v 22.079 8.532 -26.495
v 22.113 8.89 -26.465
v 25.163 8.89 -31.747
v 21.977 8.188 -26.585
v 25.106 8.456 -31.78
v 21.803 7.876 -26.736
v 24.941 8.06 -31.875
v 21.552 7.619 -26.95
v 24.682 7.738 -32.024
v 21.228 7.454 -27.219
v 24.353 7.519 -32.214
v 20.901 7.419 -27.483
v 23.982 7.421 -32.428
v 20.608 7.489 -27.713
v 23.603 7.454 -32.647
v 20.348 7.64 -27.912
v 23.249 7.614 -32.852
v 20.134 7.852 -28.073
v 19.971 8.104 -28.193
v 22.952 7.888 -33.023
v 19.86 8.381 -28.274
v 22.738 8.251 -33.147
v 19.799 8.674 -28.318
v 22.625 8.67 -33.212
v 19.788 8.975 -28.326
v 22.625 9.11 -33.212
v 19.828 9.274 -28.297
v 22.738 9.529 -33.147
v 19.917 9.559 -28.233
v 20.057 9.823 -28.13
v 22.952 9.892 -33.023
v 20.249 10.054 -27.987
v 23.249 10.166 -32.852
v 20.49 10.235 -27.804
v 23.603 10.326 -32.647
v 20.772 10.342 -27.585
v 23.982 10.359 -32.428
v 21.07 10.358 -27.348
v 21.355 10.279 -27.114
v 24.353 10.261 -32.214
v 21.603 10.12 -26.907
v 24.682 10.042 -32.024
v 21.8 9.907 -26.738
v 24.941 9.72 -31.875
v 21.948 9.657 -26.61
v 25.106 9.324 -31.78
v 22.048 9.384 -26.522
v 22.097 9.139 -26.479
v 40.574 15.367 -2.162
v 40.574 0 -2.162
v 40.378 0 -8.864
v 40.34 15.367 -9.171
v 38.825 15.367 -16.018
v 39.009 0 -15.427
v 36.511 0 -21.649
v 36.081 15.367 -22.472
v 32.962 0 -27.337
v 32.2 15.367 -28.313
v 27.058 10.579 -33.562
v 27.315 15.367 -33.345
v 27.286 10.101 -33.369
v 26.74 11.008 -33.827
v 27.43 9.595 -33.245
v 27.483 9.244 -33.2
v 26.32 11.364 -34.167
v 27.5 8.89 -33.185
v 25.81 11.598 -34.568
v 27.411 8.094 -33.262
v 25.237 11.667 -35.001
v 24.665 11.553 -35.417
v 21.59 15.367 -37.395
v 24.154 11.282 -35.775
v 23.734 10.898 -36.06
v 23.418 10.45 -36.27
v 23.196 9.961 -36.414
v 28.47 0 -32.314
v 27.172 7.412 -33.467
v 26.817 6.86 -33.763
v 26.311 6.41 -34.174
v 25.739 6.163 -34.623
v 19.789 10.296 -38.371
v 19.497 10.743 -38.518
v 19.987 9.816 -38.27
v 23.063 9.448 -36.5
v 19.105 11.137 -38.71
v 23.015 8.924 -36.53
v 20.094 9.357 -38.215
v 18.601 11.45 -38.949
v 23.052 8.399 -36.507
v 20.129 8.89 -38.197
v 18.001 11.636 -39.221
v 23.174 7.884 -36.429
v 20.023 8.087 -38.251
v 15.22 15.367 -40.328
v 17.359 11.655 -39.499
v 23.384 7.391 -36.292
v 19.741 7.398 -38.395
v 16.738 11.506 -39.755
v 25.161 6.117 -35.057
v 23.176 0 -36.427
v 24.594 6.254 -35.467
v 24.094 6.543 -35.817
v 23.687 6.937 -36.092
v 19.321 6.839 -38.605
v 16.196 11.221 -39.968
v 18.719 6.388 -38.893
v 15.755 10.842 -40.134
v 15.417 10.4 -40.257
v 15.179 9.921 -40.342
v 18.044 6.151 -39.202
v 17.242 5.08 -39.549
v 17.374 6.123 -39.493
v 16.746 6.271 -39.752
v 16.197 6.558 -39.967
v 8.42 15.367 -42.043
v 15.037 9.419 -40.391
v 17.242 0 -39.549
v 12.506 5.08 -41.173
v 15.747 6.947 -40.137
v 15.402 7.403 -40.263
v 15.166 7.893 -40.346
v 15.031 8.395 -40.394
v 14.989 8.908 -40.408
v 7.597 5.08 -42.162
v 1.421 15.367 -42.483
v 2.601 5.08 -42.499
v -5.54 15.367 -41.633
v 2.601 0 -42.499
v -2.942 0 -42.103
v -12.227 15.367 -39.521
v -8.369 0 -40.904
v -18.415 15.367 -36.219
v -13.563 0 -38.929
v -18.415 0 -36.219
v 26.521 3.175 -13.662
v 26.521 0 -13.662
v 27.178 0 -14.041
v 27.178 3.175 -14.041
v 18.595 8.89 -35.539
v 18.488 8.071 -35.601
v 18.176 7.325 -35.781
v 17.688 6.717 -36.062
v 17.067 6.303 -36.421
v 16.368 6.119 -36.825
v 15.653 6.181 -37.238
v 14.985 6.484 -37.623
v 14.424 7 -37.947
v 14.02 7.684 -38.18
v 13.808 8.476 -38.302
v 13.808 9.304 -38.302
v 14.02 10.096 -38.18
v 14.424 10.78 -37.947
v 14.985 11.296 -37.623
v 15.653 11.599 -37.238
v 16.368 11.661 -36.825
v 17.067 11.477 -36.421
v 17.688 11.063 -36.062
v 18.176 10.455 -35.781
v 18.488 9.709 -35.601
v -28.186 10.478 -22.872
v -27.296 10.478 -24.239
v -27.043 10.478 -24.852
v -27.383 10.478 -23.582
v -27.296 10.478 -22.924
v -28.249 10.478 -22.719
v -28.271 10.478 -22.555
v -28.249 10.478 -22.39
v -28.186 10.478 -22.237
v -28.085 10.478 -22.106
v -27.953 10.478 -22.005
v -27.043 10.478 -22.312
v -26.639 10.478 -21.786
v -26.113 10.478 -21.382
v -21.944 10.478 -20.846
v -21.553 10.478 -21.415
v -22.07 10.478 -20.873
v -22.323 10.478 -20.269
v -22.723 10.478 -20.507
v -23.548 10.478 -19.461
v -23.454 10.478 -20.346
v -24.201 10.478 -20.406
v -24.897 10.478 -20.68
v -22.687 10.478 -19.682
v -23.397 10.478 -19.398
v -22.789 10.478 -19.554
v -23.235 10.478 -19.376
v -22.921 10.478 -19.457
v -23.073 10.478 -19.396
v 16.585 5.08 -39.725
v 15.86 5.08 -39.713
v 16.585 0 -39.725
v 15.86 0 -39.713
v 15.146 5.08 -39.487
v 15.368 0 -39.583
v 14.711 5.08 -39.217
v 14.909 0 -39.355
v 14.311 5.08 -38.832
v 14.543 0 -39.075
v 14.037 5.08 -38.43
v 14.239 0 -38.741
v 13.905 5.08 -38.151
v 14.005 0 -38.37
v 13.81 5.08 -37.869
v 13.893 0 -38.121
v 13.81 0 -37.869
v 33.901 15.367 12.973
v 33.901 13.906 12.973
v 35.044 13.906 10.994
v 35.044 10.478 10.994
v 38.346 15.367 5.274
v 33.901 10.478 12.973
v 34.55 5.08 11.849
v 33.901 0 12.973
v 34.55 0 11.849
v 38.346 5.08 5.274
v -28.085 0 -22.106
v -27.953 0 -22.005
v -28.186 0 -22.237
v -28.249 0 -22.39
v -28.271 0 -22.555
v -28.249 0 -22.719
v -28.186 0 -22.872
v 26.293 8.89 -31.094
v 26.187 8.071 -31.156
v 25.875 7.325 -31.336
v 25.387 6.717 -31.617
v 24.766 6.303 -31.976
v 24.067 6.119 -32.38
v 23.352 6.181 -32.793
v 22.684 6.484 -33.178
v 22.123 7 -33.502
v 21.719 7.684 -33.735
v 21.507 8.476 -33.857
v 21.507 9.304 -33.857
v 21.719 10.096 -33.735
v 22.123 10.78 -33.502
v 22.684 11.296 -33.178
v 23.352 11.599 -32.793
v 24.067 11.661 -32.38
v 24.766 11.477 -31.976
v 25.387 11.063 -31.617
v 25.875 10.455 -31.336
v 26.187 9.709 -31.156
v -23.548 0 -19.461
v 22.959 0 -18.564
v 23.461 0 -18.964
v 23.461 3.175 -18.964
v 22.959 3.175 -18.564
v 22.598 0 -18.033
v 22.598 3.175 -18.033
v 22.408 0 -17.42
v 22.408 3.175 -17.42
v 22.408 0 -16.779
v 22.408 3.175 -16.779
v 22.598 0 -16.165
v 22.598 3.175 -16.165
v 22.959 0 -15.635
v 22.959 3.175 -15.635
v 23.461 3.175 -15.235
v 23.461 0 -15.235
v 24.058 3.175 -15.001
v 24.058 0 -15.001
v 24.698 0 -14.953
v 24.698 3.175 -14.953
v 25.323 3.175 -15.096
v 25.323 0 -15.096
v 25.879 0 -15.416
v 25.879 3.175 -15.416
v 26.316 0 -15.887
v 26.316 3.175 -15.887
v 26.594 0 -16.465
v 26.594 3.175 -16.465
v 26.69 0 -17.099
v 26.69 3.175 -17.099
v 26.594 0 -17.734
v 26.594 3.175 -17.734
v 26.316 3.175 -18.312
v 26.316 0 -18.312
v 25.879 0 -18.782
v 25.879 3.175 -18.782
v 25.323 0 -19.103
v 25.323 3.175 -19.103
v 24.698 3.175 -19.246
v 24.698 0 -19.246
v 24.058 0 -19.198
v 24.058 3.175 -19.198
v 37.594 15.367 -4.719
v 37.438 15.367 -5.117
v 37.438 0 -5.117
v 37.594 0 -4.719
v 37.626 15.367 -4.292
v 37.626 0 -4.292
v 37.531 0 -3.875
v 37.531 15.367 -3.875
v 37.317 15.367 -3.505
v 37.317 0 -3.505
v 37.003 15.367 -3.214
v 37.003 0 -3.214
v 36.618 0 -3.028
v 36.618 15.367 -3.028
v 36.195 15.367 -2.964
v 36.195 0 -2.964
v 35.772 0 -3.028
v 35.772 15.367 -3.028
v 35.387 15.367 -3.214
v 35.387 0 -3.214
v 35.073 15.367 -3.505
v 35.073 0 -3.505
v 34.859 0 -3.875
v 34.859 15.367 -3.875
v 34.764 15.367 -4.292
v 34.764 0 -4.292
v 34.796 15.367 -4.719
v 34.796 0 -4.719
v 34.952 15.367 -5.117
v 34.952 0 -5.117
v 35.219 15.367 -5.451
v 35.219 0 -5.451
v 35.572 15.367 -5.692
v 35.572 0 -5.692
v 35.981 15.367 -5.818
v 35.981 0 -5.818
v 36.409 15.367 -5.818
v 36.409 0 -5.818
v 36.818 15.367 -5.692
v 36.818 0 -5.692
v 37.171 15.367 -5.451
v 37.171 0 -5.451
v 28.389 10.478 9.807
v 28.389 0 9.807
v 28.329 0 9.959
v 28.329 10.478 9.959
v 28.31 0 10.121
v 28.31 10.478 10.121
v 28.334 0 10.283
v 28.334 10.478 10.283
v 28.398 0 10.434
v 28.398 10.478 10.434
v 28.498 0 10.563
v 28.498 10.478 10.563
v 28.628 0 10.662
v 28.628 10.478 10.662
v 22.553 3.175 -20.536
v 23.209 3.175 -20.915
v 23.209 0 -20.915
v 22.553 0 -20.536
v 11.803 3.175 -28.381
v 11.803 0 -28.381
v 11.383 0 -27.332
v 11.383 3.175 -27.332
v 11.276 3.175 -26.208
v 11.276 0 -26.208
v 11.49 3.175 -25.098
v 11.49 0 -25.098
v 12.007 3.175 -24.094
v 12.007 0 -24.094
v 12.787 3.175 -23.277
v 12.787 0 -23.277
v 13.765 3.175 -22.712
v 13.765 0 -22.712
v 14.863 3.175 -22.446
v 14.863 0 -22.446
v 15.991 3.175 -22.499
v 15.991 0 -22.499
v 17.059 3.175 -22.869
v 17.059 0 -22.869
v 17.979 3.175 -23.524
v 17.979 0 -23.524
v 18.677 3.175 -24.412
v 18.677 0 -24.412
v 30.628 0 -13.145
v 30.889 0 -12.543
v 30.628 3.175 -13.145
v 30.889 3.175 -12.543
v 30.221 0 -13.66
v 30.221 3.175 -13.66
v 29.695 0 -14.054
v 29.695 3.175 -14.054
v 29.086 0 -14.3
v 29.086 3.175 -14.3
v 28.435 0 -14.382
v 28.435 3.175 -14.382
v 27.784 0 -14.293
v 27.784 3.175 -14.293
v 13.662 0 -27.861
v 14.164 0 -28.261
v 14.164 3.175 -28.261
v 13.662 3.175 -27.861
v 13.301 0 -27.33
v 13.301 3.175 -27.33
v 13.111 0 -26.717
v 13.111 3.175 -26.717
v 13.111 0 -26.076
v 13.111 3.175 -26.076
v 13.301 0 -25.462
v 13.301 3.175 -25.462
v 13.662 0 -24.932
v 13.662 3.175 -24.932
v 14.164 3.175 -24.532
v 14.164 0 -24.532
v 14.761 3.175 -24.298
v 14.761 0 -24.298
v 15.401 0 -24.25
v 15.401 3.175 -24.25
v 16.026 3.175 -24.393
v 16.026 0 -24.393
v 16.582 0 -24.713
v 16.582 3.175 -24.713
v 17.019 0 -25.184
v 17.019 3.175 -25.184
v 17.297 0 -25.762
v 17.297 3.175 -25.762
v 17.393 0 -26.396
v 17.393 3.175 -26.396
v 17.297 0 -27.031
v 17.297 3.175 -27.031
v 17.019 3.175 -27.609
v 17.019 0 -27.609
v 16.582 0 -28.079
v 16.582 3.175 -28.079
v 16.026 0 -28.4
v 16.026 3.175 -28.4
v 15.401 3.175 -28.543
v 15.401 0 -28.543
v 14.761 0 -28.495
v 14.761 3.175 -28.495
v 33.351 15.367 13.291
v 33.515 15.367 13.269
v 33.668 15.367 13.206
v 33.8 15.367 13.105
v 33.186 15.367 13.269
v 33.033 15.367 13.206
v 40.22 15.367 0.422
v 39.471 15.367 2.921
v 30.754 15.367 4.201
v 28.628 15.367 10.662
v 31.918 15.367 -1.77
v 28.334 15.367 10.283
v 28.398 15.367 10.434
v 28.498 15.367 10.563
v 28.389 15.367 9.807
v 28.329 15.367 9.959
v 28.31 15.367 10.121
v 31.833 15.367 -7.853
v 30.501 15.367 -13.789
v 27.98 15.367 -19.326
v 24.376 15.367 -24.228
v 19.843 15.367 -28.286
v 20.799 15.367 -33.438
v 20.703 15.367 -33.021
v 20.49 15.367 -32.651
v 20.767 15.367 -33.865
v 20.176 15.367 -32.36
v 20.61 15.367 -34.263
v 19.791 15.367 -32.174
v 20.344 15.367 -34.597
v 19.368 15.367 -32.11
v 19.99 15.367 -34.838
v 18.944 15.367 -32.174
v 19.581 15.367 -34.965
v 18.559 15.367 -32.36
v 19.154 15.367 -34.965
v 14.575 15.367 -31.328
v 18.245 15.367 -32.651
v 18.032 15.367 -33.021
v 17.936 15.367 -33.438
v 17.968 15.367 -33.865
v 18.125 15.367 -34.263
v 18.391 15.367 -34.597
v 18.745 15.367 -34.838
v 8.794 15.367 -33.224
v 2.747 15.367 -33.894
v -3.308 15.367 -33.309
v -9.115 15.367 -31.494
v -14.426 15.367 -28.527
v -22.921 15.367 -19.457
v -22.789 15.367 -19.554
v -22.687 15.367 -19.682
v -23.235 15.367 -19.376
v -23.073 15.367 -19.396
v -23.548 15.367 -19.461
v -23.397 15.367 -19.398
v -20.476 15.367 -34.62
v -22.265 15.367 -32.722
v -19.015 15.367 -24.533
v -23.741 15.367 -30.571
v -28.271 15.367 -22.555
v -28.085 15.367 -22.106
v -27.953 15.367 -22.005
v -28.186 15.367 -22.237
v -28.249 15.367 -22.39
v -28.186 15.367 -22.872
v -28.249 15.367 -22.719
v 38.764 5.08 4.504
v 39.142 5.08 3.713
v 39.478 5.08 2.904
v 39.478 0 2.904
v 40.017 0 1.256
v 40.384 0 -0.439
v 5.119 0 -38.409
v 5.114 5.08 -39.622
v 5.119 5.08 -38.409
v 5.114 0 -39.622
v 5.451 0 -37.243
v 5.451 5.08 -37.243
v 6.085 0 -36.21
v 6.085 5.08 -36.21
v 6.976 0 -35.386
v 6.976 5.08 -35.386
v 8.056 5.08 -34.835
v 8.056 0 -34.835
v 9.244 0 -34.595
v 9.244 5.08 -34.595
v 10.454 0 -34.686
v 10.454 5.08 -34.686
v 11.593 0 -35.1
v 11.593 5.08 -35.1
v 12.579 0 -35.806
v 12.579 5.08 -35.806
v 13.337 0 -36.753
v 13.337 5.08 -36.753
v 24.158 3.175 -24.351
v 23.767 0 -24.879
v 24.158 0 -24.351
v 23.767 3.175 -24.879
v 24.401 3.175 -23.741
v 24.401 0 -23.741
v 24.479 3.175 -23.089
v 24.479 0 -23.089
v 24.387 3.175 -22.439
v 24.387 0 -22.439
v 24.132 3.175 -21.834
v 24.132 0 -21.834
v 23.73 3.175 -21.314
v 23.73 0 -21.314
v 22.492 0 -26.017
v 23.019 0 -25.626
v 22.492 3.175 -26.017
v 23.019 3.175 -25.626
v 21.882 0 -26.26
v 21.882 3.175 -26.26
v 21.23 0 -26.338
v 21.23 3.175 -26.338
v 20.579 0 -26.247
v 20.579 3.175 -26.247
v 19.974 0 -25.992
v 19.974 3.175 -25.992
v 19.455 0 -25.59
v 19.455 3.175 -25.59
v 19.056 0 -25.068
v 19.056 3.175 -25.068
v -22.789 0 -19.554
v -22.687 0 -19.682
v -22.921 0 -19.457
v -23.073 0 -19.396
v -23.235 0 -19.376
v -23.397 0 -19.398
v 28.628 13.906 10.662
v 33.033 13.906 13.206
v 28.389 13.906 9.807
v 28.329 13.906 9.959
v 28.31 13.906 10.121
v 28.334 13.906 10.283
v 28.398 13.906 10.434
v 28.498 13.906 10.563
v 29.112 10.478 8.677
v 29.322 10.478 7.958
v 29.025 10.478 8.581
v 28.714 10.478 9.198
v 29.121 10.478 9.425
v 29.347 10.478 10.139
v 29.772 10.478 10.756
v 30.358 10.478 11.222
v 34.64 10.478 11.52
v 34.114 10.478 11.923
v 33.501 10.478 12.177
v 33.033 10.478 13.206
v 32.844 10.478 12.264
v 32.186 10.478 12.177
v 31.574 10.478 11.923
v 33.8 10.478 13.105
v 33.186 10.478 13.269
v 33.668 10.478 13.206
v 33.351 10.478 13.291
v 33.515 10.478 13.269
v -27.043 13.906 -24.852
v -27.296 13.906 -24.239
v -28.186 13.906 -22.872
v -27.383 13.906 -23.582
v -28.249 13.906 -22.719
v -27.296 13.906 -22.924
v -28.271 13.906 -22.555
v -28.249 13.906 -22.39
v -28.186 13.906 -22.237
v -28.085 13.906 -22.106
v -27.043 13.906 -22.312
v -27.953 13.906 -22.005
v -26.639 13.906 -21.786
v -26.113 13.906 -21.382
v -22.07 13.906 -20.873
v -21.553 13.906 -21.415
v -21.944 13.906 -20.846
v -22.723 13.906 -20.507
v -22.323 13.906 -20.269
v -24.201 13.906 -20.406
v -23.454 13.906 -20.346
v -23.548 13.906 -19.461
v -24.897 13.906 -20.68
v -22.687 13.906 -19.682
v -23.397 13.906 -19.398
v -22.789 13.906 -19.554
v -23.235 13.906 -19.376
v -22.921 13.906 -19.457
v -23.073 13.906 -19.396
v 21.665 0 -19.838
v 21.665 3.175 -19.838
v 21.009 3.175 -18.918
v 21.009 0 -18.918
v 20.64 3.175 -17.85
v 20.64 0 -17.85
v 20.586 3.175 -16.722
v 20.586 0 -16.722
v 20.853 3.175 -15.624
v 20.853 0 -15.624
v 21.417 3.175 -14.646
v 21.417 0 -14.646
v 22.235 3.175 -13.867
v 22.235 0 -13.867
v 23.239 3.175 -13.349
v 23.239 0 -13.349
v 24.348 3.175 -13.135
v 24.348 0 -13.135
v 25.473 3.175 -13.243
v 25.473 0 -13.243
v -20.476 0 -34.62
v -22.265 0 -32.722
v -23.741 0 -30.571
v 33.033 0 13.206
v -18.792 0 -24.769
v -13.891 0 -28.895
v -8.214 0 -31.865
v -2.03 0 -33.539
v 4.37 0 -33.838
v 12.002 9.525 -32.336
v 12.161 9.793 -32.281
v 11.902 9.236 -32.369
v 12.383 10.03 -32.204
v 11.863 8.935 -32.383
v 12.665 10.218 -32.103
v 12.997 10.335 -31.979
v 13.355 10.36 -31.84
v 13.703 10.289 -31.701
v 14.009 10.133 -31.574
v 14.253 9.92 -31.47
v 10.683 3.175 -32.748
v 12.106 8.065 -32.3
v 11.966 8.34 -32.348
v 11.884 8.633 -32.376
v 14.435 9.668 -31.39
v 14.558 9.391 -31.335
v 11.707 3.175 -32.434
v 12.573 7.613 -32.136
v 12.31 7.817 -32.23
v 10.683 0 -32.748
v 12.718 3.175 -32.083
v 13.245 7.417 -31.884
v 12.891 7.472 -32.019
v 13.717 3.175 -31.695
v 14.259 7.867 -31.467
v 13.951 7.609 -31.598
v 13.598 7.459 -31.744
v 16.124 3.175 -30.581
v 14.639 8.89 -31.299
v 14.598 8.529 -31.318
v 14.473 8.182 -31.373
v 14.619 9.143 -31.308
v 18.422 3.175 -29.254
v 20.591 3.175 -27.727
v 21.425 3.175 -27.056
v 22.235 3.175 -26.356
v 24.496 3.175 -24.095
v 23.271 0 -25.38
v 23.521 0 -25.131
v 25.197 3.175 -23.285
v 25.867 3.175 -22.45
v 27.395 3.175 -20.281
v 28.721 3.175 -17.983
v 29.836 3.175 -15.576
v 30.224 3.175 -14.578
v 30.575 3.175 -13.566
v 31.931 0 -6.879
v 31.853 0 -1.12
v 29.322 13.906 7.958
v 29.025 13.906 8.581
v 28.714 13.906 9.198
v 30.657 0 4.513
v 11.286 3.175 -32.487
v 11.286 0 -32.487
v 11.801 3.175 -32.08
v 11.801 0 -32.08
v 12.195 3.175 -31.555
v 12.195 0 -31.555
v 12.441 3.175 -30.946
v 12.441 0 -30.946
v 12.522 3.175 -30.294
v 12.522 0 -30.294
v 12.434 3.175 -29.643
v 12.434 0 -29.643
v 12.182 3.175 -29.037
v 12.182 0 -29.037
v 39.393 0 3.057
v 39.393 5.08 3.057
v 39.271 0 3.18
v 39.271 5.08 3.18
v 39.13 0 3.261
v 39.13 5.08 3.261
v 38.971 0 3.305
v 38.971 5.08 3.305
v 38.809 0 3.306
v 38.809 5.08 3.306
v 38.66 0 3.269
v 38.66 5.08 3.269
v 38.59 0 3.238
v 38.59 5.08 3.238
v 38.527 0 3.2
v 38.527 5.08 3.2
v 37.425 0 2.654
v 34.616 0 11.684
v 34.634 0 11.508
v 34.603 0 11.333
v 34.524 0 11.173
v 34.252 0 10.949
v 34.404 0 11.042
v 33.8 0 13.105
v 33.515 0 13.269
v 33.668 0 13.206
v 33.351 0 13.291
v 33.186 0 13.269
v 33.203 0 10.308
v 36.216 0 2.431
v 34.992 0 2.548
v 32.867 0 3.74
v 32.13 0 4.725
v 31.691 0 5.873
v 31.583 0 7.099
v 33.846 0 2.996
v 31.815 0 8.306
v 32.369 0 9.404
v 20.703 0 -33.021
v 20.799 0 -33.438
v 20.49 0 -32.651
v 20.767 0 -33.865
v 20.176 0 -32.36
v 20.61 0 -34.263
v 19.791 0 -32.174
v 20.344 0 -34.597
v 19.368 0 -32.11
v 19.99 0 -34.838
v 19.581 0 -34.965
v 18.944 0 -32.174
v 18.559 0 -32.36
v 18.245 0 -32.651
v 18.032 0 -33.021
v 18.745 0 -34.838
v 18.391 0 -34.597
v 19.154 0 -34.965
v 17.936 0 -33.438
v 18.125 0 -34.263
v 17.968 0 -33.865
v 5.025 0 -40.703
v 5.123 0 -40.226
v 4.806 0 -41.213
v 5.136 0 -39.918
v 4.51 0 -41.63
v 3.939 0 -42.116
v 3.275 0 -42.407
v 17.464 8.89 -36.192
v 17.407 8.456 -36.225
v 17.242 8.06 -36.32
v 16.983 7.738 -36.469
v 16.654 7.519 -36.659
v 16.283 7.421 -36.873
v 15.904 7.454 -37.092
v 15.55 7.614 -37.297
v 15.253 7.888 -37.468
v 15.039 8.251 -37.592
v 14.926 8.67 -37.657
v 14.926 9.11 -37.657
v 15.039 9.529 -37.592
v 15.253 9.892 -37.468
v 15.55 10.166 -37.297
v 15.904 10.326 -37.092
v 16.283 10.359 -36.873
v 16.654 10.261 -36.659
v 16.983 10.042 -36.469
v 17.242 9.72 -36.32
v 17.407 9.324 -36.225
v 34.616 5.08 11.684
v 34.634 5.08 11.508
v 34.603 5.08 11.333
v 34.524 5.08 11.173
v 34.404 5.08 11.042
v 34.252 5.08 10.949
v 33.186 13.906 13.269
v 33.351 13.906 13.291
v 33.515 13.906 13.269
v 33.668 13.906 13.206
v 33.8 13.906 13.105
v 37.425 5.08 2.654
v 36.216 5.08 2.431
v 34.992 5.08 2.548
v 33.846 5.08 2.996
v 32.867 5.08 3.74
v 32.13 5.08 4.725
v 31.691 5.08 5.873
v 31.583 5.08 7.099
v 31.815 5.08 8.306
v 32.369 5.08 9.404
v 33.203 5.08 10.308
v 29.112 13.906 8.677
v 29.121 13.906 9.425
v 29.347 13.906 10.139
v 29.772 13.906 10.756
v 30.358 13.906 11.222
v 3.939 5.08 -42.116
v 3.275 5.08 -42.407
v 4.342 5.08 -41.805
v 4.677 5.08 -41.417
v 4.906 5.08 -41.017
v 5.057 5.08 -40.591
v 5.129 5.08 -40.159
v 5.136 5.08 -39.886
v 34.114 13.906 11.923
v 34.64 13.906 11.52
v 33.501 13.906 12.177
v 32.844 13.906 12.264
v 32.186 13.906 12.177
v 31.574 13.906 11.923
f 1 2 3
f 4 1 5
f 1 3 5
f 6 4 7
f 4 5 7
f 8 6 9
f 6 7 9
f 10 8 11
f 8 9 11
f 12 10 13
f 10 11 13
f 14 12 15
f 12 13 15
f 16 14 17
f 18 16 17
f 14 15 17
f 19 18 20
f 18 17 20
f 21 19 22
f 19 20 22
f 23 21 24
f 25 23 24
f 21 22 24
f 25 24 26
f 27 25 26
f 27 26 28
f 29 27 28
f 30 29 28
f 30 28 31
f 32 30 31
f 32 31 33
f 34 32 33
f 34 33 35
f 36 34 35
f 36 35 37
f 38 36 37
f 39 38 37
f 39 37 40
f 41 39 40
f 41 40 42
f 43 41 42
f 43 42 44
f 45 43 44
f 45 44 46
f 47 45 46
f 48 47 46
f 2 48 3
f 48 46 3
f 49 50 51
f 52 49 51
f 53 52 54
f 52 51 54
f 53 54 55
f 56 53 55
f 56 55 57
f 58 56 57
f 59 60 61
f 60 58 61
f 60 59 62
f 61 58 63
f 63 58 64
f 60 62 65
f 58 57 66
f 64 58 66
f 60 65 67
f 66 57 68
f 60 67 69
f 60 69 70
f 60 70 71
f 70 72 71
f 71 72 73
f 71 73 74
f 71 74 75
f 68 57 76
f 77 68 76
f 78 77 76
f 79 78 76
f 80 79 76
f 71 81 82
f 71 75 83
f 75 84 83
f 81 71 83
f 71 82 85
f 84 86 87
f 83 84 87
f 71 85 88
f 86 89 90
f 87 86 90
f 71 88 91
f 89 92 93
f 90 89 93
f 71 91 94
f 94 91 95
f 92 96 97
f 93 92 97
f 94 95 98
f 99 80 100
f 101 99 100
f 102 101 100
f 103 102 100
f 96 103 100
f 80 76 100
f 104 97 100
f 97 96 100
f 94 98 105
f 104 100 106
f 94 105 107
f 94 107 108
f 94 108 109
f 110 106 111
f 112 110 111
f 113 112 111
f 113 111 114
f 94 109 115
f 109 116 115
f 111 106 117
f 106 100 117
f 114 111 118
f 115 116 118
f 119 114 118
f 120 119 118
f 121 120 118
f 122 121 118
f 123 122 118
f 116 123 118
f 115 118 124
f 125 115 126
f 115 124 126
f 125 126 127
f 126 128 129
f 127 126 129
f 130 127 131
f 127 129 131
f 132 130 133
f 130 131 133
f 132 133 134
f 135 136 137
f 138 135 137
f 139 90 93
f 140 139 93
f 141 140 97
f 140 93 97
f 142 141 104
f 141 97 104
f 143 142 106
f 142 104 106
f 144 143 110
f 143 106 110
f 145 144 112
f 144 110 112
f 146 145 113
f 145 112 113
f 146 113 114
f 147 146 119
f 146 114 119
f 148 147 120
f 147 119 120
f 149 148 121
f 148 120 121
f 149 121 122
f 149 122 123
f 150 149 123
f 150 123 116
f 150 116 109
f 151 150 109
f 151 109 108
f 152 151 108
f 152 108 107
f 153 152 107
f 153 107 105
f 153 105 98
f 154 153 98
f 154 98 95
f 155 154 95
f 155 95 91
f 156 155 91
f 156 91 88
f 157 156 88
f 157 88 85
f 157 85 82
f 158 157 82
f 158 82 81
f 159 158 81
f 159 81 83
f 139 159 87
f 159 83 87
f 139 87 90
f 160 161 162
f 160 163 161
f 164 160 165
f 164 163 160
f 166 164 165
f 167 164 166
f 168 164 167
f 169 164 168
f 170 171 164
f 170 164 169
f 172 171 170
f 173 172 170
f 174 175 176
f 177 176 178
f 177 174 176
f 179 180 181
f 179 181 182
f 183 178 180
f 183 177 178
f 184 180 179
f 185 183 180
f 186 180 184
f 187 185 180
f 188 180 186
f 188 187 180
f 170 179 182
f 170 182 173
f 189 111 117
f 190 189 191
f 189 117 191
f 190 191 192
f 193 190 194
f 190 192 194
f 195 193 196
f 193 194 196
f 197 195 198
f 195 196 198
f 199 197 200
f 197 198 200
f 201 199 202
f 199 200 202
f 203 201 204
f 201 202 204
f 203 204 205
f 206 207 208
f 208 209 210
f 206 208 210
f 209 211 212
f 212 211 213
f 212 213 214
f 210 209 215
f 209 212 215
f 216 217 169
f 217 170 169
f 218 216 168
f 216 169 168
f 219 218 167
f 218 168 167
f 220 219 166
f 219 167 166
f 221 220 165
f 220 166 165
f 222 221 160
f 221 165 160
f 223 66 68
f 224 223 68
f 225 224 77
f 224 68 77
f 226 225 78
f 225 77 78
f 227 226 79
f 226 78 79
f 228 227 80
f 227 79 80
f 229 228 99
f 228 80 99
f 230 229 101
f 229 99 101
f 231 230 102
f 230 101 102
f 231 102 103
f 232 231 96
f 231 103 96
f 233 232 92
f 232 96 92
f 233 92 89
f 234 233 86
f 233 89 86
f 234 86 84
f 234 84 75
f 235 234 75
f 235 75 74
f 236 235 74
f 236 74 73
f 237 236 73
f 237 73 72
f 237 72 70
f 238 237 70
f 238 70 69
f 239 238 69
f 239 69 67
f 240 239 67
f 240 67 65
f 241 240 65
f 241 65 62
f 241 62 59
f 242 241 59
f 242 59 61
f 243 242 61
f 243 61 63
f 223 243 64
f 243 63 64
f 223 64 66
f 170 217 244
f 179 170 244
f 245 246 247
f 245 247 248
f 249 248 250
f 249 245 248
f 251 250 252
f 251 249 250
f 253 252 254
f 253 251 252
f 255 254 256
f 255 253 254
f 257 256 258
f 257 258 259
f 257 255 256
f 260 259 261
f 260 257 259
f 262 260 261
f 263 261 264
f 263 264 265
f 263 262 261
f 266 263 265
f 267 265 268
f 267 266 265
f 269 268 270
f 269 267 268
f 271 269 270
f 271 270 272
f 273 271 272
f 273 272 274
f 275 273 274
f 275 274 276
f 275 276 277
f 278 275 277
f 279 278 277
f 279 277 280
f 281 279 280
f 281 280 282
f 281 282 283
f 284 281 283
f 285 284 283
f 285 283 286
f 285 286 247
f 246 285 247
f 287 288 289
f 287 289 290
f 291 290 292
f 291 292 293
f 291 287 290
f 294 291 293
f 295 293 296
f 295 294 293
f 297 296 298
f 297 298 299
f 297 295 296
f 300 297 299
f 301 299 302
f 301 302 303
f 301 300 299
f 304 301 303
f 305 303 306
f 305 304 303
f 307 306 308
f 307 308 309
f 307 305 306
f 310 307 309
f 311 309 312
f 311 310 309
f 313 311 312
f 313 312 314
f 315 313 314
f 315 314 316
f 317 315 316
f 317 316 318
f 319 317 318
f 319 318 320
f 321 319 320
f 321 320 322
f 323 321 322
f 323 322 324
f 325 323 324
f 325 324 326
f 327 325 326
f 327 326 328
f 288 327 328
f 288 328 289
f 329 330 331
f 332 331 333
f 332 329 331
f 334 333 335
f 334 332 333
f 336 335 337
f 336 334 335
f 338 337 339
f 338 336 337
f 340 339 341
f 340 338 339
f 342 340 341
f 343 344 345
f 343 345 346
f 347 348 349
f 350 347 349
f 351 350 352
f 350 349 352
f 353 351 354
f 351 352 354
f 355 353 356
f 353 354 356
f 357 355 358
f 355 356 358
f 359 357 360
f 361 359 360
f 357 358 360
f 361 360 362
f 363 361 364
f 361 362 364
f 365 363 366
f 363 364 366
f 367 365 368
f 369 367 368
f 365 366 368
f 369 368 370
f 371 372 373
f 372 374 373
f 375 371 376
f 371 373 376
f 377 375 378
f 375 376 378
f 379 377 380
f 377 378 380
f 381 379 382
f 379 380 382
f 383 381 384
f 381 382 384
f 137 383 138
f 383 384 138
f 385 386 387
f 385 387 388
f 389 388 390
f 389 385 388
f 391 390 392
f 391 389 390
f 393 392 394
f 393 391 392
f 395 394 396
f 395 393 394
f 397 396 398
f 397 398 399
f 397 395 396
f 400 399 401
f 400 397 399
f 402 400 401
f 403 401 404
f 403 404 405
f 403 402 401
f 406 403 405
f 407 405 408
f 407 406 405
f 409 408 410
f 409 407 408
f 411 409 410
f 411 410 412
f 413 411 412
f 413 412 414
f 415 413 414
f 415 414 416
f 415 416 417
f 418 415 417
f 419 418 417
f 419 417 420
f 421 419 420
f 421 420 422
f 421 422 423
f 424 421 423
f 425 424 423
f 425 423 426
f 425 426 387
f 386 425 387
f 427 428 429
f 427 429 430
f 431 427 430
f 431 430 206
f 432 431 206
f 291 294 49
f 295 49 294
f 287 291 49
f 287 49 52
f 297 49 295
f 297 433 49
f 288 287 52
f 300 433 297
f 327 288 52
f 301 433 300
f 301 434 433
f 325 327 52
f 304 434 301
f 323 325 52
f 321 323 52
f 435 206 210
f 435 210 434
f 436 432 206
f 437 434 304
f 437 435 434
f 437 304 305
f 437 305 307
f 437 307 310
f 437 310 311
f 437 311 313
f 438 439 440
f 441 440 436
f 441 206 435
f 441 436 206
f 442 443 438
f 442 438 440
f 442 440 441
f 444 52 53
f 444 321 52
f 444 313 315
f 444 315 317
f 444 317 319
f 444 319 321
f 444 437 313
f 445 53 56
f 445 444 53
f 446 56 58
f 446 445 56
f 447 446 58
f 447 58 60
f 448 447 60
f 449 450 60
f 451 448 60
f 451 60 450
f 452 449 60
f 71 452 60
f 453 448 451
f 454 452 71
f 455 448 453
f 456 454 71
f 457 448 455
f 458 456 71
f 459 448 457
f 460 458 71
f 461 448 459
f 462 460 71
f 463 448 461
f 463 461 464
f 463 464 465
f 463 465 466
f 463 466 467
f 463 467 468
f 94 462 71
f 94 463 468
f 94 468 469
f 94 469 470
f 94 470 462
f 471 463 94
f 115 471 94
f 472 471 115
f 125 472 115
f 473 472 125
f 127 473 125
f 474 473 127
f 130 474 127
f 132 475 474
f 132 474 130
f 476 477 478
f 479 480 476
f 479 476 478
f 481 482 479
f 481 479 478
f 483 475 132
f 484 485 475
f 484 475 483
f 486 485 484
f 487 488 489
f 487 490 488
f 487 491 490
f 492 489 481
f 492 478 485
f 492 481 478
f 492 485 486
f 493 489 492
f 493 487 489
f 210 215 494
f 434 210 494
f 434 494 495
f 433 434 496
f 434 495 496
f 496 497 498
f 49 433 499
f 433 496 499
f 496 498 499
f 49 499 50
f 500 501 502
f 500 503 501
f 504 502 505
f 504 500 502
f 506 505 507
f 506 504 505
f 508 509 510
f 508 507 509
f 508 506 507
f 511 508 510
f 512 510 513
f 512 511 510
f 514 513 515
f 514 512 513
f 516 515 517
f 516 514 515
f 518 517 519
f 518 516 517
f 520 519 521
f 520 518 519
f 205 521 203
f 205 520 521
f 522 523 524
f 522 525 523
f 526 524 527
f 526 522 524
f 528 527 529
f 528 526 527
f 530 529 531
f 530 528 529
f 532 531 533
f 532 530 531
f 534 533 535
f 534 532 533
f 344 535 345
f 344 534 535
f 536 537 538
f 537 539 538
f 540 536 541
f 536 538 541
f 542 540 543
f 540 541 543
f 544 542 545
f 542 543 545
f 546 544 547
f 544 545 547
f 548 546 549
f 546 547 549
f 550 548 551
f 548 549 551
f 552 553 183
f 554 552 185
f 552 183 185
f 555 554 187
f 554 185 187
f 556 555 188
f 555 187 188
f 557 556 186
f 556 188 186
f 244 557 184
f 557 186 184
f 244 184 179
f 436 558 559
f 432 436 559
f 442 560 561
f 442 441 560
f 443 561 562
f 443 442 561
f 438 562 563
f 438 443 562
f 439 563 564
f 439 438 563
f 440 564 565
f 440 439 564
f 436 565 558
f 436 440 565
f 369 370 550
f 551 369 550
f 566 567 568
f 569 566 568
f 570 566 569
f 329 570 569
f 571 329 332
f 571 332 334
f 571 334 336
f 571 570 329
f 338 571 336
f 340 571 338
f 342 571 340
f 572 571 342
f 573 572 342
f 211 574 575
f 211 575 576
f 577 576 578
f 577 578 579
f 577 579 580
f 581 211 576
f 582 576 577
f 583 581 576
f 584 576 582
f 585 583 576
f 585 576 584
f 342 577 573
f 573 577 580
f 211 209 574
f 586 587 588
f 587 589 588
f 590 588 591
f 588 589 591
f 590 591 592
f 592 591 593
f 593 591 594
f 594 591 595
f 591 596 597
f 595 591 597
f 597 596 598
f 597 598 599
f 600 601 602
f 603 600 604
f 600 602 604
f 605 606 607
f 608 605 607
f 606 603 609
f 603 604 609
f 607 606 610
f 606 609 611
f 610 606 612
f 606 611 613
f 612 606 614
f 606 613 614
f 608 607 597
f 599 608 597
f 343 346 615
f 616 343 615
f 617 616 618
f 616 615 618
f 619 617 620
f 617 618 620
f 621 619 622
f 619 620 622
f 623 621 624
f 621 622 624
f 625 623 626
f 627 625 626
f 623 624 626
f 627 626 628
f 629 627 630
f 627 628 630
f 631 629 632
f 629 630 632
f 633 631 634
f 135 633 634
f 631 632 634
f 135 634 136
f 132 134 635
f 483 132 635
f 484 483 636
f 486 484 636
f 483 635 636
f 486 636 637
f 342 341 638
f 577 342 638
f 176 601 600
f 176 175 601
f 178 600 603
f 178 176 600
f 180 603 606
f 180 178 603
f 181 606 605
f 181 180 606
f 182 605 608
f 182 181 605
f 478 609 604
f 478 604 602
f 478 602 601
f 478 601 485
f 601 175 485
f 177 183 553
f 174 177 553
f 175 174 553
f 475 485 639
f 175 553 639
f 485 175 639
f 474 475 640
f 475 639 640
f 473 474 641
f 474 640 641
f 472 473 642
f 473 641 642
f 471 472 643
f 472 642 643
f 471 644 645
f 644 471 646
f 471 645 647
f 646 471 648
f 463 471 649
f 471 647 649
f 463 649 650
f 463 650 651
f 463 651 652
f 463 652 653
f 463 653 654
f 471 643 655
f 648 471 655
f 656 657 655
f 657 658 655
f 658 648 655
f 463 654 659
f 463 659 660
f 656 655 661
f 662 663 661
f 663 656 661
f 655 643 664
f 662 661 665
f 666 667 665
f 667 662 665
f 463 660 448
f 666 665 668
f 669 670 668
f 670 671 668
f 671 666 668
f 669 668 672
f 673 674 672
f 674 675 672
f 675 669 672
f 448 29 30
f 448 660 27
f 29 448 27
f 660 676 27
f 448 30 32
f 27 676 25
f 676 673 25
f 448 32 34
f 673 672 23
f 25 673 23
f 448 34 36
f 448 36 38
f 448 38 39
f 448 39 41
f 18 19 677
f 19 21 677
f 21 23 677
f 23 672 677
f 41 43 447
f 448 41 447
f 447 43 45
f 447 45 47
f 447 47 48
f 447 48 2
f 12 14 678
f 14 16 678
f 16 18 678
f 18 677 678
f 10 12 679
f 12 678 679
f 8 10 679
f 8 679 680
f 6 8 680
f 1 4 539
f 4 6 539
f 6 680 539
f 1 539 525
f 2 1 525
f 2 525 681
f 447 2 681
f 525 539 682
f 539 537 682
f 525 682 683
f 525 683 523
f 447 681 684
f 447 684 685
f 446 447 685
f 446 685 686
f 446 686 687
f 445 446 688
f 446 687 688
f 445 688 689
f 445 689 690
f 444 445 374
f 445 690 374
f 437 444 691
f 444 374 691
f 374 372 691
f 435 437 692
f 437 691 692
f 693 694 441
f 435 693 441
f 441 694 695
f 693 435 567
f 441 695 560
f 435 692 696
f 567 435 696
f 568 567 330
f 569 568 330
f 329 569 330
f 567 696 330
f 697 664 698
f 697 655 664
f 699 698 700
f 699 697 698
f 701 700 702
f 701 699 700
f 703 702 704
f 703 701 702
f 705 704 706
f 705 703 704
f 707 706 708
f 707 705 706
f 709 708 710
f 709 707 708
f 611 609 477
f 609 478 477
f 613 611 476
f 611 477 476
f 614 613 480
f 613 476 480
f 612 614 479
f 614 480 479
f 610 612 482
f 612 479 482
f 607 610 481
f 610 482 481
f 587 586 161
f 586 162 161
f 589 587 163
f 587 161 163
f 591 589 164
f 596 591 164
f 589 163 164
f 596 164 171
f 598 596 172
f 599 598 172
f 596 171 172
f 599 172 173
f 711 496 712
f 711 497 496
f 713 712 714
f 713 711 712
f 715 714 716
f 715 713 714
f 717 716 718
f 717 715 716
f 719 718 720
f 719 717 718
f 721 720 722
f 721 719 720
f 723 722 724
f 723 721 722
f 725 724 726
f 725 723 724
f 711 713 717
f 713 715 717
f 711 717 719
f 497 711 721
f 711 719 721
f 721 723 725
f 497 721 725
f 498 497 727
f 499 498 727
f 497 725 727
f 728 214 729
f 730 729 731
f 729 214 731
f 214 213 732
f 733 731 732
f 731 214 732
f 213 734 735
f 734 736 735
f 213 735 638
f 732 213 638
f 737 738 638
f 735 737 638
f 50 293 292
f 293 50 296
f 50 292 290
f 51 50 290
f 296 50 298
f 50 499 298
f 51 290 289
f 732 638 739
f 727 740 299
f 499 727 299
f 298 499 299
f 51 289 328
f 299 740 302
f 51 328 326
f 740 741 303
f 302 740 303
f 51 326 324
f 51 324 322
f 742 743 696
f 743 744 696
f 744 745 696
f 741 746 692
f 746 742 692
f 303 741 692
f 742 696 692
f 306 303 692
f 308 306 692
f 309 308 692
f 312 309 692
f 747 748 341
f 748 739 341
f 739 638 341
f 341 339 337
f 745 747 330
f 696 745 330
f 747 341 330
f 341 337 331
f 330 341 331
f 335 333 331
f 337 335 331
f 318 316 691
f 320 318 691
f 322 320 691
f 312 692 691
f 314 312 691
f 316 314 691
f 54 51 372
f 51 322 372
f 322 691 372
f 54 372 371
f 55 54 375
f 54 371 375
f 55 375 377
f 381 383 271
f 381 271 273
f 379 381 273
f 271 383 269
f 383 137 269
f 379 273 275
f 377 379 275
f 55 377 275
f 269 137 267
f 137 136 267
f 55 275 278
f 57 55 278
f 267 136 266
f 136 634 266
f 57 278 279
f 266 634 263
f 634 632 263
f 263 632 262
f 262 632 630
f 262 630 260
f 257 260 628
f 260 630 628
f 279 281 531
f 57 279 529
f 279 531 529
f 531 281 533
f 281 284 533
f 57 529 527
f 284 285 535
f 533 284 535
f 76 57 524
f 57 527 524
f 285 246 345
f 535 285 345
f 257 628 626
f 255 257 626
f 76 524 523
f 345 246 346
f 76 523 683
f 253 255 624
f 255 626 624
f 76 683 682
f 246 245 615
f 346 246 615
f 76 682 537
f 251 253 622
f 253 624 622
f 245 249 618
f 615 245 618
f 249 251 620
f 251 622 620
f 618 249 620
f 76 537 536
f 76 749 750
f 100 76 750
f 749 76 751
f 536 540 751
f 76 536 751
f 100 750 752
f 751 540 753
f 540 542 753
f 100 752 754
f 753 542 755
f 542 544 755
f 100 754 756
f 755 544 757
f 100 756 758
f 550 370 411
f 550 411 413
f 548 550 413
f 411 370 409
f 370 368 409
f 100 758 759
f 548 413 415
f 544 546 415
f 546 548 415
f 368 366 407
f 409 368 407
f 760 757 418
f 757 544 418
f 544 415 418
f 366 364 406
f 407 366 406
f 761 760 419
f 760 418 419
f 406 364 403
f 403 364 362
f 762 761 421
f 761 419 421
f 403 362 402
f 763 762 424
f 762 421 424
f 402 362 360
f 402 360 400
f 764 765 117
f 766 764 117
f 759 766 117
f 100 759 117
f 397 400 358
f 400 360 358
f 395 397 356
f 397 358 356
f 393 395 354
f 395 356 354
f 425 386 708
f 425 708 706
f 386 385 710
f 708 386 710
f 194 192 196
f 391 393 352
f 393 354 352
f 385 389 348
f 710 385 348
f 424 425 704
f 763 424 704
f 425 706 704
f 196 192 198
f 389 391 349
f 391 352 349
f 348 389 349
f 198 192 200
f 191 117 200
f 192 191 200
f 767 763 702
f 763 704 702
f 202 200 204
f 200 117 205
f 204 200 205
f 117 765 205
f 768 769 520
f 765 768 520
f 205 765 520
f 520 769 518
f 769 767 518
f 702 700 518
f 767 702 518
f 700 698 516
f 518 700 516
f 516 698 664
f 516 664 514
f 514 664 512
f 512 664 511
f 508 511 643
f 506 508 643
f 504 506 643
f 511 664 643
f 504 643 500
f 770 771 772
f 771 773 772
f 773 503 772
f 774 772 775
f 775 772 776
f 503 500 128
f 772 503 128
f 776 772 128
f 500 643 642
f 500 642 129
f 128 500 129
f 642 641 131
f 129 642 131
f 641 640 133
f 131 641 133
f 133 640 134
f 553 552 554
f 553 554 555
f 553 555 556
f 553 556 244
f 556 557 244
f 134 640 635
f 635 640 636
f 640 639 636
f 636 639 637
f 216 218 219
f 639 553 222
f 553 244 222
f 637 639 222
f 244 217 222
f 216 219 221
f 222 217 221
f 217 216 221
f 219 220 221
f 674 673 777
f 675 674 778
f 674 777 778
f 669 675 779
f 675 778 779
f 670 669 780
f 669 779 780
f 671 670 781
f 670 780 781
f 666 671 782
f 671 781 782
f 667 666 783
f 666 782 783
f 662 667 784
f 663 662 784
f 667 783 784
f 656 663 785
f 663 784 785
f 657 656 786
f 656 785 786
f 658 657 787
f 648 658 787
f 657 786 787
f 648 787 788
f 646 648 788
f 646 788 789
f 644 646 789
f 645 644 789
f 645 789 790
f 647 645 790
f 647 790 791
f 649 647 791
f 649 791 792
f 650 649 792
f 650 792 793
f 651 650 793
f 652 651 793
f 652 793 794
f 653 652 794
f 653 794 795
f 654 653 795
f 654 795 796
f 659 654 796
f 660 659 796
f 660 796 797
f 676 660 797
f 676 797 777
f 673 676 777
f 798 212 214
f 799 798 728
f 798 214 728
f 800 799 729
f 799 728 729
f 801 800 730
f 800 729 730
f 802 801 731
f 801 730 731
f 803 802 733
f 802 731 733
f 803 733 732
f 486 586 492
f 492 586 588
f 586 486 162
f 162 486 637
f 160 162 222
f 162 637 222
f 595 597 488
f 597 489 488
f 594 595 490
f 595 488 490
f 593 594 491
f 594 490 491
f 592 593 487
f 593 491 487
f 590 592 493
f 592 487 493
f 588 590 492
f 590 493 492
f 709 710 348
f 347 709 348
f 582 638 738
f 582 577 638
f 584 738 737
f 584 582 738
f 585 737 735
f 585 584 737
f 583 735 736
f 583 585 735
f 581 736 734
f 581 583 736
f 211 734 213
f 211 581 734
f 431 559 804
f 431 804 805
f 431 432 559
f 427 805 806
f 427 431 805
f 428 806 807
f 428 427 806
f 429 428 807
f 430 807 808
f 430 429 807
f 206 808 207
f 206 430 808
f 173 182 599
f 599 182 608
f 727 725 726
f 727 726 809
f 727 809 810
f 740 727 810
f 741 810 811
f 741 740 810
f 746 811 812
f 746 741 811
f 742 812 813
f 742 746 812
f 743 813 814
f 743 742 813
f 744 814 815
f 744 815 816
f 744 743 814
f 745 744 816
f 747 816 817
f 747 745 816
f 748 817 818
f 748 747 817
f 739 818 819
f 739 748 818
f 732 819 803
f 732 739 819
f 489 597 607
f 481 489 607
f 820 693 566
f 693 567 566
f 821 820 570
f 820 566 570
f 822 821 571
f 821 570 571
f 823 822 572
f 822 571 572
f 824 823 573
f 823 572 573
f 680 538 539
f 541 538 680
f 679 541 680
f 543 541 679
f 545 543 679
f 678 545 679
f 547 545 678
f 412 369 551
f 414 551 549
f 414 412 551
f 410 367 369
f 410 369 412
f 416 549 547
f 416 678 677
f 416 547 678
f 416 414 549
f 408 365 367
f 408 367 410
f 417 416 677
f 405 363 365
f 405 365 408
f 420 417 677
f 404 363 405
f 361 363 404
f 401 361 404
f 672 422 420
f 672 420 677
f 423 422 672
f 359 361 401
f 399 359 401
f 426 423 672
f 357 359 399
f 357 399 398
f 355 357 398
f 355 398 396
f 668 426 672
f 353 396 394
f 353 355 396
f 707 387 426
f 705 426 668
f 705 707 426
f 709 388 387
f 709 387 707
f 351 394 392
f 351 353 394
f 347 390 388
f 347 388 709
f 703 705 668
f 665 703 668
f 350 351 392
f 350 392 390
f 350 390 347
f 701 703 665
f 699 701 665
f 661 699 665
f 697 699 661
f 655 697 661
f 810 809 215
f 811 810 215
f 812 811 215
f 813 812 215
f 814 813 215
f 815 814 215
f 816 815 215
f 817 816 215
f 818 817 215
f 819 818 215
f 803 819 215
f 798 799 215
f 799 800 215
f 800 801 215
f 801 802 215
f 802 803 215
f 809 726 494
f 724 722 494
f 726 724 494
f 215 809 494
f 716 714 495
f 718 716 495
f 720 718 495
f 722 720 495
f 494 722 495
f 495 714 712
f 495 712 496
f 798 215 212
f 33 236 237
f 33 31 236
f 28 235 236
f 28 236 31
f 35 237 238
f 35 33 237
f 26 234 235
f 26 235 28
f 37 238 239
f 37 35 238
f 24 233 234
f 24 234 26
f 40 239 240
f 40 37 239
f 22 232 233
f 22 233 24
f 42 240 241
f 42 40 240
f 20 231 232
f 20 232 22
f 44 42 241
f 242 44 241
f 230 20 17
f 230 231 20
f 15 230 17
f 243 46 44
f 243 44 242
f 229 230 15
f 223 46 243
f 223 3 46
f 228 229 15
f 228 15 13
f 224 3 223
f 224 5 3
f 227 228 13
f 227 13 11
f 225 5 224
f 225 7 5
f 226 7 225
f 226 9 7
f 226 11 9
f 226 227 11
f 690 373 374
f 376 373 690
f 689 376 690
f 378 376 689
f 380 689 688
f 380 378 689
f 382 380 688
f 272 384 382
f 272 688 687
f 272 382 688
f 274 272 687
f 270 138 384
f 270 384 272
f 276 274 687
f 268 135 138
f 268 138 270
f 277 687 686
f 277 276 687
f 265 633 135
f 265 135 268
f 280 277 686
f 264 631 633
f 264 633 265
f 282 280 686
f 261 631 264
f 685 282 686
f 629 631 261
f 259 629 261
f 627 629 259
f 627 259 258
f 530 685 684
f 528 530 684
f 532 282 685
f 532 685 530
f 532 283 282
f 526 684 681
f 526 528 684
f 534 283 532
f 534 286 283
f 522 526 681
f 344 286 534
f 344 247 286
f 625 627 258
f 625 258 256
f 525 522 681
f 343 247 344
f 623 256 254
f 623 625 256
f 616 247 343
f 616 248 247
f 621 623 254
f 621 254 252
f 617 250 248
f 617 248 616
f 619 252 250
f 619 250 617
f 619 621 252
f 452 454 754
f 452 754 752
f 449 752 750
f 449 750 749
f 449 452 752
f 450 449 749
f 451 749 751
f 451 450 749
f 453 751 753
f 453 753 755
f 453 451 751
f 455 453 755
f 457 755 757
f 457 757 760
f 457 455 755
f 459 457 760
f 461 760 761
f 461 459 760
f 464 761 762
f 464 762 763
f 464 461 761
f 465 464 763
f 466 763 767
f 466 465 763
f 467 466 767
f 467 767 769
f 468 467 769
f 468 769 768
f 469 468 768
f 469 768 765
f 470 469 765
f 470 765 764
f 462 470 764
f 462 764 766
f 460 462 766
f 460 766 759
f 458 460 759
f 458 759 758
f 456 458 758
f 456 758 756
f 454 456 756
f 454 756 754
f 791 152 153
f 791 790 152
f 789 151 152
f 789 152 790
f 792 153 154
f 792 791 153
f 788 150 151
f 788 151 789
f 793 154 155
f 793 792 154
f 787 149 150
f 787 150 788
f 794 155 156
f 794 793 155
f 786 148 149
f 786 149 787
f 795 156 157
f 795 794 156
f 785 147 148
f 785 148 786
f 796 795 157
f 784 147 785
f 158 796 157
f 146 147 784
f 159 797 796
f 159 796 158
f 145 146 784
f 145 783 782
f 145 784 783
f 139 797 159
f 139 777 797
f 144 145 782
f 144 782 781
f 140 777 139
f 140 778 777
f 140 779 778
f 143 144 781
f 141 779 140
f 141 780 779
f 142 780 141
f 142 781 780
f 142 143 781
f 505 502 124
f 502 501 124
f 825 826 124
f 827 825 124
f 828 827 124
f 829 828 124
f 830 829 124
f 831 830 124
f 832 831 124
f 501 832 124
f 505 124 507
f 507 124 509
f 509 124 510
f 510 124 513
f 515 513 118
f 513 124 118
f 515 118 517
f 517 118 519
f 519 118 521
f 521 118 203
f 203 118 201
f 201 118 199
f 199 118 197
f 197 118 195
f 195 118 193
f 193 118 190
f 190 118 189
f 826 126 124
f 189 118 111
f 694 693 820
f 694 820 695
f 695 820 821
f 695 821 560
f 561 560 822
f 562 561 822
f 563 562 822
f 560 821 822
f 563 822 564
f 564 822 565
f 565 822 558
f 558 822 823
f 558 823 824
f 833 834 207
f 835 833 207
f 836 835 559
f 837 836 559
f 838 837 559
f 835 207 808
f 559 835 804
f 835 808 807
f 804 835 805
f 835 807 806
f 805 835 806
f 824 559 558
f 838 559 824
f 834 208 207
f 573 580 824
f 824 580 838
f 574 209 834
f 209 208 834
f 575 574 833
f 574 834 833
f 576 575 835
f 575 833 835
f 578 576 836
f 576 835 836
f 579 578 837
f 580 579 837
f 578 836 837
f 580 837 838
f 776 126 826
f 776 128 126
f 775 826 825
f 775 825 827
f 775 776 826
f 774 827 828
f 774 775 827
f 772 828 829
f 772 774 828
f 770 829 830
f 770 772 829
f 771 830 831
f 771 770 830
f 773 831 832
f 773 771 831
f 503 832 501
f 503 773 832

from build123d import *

# Parameters (mm, degrees)
BOSS_EXTRUDE1_DEPTH                        = 15.367
BOSS_EXTRUDE2_DEPTH                        = 3.175
F_8_CLEARANCE_HOLE1_D                      = 4.3053
SKETCH10_R                                 = 4.445
CUT_EXTRUDE2_DEPTH                         = 5.08
FILLET3_R                                  = 2.54
SKETCH12_W                                 = 0.381
SKETCH12_H                                 = 3.429
CUT_EXTRUDE5_DEPTH                         = 80.383868095
FILLET6_R                                  = 2.54
CBORE_START                                = -39
CBORE_FOR_4_SOCKET_HEAD_CAP_SCREW1_OUTL_R  = 2.77876
CBORE_FOR_4_SOCKET_HEAD_CAP_SCREW1_DEPTH   = 4.004980035
CBORE_START_2                              = -34.995019965
CBORE_FOR_4_SOCKET_HEAD_CAP_SCREW1_2_OU_R  = 1.4732
CBORE_FOR_4_SOCKET_HEAD_CAP_SCREW1_2_DEPTH = 6.995019965
CUT_EXTRUDE6_REACH                         = 58.03
SKETCH17_R                                 = 1.4351
FILLET7_R                                  = 0.635
CUT_EXTRUDE7_DEPTH                         = 61.777907815


with BuildPart() as part:
    # Sketch1 → Boss-Extrude1 (new body)
    with BuildSketch(Plane(origin=(0, 0, 0), x_dir=(1, 0, 0), z_dir=(0, 1, 0))):
        with BuildLine():
            Line((-35.805540197, 9.673815643), (-31.043040197, 17.922707614))
            Line((-31.043040197, 17.922707614), (-25.543778883, 14.747707614))
            ThreePointArc((-25.543778883, 14.747707614), (-14.747707614, -25.543778883), (25.543778883, -14.747707614))
            Line((25.543778883, -14.747707614), (31.043040197, -17.922707614))
            Line((31.043040197, -17.922707614), (26.280540197, -26.171599585))
            ThreePointArc((26.280540197, -26.171599585), (23.947229931, -29.306716595), (20.954526486, -31.820085162))
            ThreePointArc((20.954526486, -31.820085162), (-19.05, -32.995567884), (-38.034265344, 2.23710968))
            ThreePointArc((-38.034265344, 2.23710968), (-37.353976038, 6.085551173), (-35.805540197, 9.673815643))
        make_face()
    extrude(amount=BOSS_EXTRUDE1_DEPTH)

    # Sketch8 → Boss-Extrude2 (add)
    with BuildSketch(Plane(origin=(0, 0, 0), x_dir=(1, 0, 0), z_dir=(0, 1, 0))):
        with BuildLine():
            Line((-9.262961679, -23.981420256), (-11.176555889, -27.295862653))
            ThreePointArc((-11.176555889, -27.295862653), (-14.747707614, -25.543778883), (-18.050632531, -23.327112653))
            Line((-18.050632531, -23.327112653), (-16.137038321, -20.012670256))
            ThreePointArc((-16.137038321, -20.012670256), (-10.715625, -18.560006935), (-9.262961679, -23.981420256))
        make_face()
        with BuildLine():
            Line((3.96875, -25.4), (3.96875, -29.22718842))
            ThreePointArc((3.96875, -29.22718842), (0, -29.495415229), (-3.96875, -29.22718842))
            Line((-3.96875, -29.22718842), (-3.96875, -25.4))
            ThreePointArc((-3.96875, -25.4), (0, -21.43125), (3.96875, -25.4))
        make_face()
    extrude(amount=BOSS_EXTRUDE2_DEPTH)

    # #8 Clearance Hole1 (through all)
    with Locations(Plane(origin=(0, 3.175, 0), x_dir=(1, 0, 0), z_dir=(0, 1, 0))):
        with Locations((0, -25.4), (-12.7, -21.997045256)):
            Hole(F_8_CLEARANCE_HOLE1_D / 2)

    # Sketch10 → Cut-Extrude2 (cut)
    with BuildSketch(Plane.XZ):
        with Locations((-26.502210802, 23.360731753)):
            Circle(SKETCH10_R)
        with Locations((26.502210802, 23.360731753)):
            Circle(SKETCH10_R)
    extrude(amount=-CUT_EXTRUDE2_DEPTH, mode=Mode.SUBTRACT)

    # Fillet3
    fillet3_edges = [part.edges().sort_by_distance(p)[0] for p in [
        (-18.050632531, 1.5875, 23.327112653),
        (-11.176555889, 1.5875, 27.295862653),
        (-3.96875, 1.5875, 29.22718842),
        (3.96875, 1.5875, 29.22718842),
        (-30.836833913, 2.54, 22.376319497),
        (-26.069605371, 2.54, 27.784630208),
    ]]
    fillet(fillet3_edges, radius=FILLET3_R)

    # Sketch12 → Cut-Extrude5 (cut, through all)
    with BuildSketch(Plane(origin=(31.043040197, 0, 17.922707614), x_dir=(0.5000000000000004, 0, -0.8660254037844384), z_dir=(0.8660254037844384, 0, 0.5000000000000004))):
        with Locations((-0.1905, 12.192)):
            Rectangle(SKETCH12_W, SKETCH12_H)
    extrude(amount=-CUT_EXTRUDE5_DEPTH, mode=Mode.SUBTRACT)

    # Fillet6
    fillet6_edges = [part.edges().sort_by_distance(p)[0] for p in [
        (-25.732147733, 12.192, -14.416521515),
        (25.351147733, 12.192, 15.076432873),
        (-31.233540197, 12.192, -17.592751936),
        (30.852540197, 12.192, 18.252663293),
    ]]
    fillet(fillet6_edges, radius=FILLET6_R)

    # CBORE for #4 Socket Head Cap Screw1: read off the stored shape, not the designer's step
    # CBORE for #4 Socket Head Cap Screw1 outl → CBORE for #4 Socket Head Cap Screw1 (cut)
    with BuildSketch(Plane(origin=(0, 0, 0), x_dir=(0.8660254037844374, 0, 0.5000000000000022), z_dir=(0.5000000000000022, 0, -0.8660254037844374)).offset(CBORE_START)):
        with Locations((4.445, -8.89)):
            Circle(CBORE_FOR_4_SOCKET_HEAD_CAP_SCREW1_OUTL_R)
        with Locations((-4.445, -8.89)):
            Circle(CBORE_FOR_4_SOCKET_HEAD_CAP_SCREW1_OUTL_R)
    extrude(amount=CBORE_FOR_4_SOCKET_HEAD_CAP_SCREW1_DEPTH, mode=Mode.SUBTRACT)

    # CBORE for _4 Socket Head Cap Screw1 2 ou → CBORE for _4 Socket Head Cap Screw1 2 (cut)
    with BuildSketch(Plane(origin=(0, 0, 0), x_dir=(0.8660254037844374, 0, 0.5000000000000022), z_dir=(0.5000000000000022, 0, -0.8660254037844374)).offset(CBORE_START_2)):
        with Locations((4.445, -8.89)):
            Circle(CBORE_FOR_4_SOCKET_HEAD_CAP_SCREW1_2_OU_R)
        with Locations((-4.445, -8.89)):
            Circle(CBORE_FOR_4_SOCKET_HEAD_CAP_SCREW1_2_OU_R)
    extrude(amount=CBORE_FOR_4_SOCKET_HEAD_CAP_SCREW1_2_DEPTH, mode=Mode.SUBTRACT)

    # Sketch17 → Cut-Extrude6 (cut, up to next)
    with BuildSketch(Plane(origin=(0, 15.367, 0), x_dir=(1, 0, 0), z_dir=(0, 1, 0)), mode=Mode.PRIVATE) as cut_extrude6_sk1:
        with Locations(Location((-16.8275, -29.146084964, 0), (0, 0, 270))):
            Circle(SKETCH17_R)
    cut_extrude6_tool1 = extrude(cut_extrude6_sk1.sketch, amount=-CUT_EXTRUDE6_REACH, mode=Mode.PRIVATE) & part.part
    # Sketch17 → Cut-Extrude6 (cut, up to next)
    with BuildSketch(Plane(origin=(0, 15.367, 0), x_dir=(1, 0, 0), z_dir=(0, 1, 0)), mode=Mode.PRIVATE) as cut_extrude6_sk2:
        with Locations(Location((16.8275, -29.146084964, 0), (0, 0, 270))):
            Circle(SKETCH17_R)
    cut_extrude6_tool2 = extrude(cut_extrude6_sk2.sketch, amount=-CUT_EXTRUDE6_REACH, mode=Mode.PRIVATE) & part.part
    add(cut_extrude6_tool1.solids().sort_by_distance((-16.8275, 15.367, 29.146085))[0], mode=Mode.SUBTRACT)
    add(cut_extrude6_tool2.solids().sort_by_distance((16.8275, 15.367, 29.146085))[0], mode=Mode.SUBTRACT)

    # Fillet7
    fillet7_edges = [part.edges().sort_by_distance(p)[0] for p in [
        (25.543778883, 5.23875, 14.747707614),
        (31.043040197, 5.23875, 17.922707614),
        (25.543778883, 14.63675, 14.747707614),
        (31.043040197, 14.63675, 17.922707614),
        (-31.043040197, 5.23875, -17.922707614),
        (-25.543778883, 5.23875, -14.747707614),
        (-31.043040197, 14.63675, -17.922707614),
        (-25.543778883, 14.63675, -14.747707614),
        (25.323084778, 2.54, 27.646485691),
        (29.691178841, 2.54, 20.264200169),
    ]]
    fillet(fillet7_edges, radius=FILLET7_R)


with BuildPart() as body_2:
    # Mirror4: mirrored copy
    add(part.part.mirror(Plane(origin=(1.27, 0, -2.199704526), x_dir=(0.8660254037844389, 0, 0.49999999999999944), z_dir=(0.49999999999999967, 0, -0.8660254037844389))))


with BuildPart() as part_1:
    add(part.part)

    # Sketch18 → Cut-Extrude7 (cut, through all)
    with BuildSketch(Plane(origin=(0, 15.367, 0), x_dir=(1, 0, 0), z_dir=(0, 1, 0))):
        Polygon((-35.598010153, 20.561277362), (38.427739113, -19.56618359), (10.396462238, -40.426668706), (-26.181818955, -37.529379107), (-44.652040151, -8.121889672), align=None)
    extrude(amount=-CUT_EXTRUDE7_DEPTH, mode=Mode.SUBTRACT)


solid = body_2.part
